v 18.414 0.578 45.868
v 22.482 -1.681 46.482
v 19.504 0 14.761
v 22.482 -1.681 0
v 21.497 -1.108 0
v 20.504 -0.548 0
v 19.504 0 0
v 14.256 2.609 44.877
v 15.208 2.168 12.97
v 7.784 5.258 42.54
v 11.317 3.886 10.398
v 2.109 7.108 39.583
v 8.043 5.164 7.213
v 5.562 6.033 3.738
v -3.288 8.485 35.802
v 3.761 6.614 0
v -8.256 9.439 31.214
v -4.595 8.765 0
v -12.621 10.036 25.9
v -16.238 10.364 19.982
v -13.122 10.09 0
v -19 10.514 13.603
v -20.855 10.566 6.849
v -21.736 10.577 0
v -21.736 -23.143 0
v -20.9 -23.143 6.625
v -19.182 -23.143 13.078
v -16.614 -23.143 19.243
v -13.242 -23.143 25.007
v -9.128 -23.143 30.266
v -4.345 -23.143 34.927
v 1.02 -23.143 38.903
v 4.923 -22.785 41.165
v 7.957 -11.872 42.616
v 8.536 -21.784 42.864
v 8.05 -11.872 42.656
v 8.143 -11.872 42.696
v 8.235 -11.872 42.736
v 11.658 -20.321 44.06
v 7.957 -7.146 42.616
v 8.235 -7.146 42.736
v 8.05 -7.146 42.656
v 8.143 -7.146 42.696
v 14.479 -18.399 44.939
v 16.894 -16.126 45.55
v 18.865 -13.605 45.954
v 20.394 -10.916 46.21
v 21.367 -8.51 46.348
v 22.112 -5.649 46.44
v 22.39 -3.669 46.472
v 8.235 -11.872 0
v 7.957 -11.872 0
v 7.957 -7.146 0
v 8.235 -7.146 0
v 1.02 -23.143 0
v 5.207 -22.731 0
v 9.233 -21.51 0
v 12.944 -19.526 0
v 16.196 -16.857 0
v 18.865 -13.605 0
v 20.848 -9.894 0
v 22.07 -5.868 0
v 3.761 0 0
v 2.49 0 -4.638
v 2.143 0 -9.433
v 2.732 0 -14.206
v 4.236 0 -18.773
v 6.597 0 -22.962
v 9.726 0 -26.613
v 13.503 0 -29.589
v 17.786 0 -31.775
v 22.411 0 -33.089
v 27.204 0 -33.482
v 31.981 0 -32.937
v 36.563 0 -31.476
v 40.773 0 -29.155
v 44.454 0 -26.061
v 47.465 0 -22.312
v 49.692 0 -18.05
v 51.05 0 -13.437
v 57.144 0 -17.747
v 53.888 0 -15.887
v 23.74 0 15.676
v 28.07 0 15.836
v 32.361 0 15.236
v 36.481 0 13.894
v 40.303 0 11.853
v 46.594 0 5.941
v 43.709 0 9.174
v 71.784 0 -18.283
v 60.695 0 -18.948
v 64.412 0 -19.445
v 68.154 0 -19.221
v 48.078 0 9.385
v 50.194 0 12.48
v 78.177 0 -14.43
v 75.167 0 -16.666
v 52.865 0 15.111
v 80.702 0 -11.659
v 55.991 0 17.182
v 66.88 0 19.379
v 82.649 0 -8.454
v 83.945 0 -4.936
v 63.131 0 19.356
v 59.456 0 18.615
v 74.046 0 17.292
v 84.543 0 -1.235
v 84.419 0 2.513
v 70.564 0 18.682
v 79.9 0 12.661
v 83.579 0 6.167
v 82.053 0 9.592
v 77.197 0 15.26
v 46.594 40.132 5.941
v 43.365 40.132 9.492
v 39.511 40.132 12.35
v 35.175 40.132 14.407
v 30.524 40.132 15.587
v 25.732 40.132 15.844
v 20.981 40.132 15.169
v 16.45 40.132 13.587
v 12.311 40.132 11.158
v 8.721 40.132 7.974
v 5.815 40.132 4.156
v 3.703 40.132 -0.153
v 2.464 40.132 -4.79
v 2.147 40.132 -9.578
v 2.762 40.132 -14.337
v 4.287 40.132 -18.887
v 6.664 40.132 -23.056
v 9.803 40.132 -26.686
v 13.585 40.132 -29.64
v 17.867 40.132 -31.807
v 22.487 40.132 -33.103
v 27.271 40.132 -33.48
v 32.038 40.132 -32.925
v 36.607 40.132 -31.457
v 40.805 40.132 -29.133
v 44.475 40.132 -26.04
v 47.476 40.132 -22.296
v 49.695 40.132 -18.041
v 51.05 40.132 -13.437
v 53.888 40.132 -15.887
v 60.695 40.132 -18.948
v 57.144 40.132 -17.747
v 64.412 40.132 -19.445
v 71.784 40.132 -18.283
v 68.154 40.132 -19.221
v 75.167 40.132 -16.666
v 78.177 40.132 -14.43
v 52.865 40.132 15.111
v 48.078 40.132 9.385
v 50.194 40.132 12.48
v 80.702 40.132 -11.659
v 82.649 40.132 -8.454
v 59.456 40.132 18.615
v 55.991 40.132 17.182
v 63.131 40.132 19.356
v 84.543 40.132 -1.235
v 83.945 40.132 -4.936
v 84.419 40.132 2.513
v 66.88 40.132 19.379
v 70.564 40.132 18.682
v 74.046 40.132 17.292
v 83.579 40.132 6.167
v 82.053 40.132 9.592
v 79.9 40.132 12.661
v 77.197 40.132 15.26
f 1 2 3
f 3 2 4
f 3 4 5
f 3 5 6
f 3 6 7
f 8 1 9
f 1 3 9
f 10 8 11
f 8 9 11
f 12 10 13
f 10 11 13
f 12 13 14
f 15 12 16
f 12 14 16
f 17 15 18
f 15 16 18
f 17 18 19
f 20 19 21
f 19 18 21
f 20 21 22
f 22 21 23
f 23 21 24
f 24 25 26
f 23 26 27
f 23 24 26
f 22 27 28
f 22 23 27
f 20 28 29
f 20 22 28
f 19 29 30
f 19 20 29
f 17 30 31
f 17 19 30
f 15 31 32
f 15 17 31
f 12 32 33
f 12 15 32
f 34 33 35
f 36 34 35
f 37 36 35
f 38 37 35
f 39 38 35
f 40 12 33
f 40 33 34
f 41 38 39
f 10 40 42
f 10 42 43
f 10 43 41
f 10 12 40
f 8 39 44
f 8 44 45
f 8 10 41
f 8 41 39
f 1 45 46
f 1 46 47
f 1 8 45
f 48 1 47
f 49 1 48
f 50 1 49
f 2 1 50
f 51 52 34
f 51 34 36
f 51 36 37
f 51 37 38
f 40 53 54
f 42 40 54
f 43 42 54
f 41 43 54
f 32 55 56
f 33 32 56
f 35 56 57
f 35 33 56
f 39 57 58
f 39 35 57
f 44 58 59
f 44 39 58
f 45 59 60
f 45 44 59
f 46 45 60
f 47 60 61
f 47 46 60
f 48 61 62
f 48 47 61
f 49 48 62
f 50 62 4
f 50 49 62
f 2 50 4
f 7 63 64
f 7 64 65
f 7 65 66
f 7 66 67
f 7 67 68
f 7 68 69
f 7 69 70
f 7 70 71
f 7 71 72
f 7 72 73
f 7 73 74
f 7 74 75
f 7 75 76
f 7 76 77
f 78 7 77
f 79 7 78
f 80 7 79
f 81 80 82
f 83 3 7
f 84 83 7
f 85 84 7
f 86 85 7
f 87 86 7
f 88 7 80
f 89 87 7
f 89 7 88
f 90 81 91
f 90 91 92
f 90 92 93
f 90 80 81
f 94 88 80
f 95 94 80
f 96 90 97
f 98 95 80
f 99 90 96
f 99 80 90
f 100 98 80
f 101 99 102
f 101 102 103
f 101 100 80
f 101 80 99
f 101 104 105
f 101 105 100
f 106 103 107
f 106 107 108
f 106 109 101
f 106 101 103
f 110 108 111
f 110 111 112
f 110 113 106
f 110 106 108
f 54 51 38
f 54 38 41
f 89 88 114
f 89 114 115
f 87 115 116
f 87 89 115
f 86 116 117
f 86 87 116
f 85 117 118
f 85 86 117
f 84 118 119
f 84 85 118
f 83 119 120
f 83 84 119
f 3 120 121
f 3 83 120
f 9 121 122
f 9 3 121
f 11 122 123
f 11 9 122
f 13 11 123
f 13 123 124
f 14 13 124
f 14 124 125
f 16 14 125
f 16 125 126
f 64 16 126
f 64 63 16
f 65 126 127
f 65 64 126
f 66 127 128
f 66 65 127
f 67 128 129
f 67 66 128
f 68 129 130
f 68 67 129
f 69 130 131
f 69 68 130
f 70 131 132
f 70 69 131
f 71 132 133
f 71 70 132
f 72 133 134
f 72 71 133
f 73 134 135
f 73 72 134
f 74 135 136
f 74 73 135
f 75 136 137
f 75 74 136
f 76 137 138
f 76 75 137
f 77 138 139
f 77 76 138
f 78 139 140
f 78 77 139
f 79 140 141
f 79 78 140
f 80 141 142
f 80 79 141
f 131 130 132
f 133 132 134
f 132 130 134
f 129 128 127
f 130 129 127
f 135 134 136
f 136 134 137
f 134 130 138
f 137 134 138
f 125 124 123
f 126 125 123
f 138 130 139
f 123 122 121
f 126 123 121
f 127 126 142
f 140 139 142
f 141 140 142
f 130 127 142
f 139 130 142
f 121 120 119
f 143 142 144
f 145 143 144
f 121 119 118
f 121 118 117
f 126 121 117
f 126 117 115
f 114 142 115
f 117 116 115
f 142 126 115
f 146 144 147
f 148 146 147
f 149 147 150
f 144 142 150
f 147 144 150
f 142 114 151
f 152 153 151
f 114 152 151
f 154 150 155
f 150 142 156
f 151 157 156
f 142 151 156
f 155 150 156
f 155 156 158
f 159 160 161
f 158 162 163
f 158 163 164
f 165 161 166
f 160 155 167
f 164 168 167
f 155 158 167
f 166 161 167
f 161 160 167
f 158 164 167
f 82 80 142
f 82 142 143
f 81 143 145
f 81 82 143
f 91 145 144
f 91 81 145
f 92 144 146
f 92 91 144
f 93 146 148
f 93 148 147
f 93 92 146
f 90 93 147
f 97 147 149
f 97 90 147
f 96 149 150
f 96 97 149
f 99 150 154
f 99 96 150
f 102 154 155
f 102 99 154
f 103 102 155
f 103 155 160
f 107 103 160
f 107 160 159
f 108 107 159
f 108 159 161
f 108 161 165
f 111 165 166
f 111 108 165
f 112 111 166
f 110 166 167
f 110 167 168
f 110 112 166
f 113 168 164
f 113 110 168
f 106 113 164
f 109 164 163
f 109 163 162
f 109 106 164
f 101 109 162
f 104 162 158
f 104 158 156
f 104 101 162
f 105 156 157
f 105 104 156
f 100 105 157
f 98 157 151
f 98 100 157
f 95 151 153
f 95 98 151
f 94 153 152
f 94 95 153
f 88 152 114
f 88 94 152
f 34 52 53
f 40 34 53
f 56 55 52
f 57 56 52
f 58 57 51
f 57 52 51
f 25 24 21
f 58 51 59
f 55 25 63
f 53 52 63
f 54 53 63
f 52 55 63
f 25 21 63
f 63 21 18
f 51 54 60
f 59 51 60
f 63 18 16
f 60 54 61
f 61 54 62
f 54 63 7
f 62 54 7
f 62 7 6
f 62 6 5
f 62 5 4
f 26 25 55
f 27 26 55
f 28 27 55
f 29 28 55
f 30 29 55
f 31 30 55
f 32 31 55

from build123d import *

# Parameters (mm, degrees)
F0_W        = 44.3030558527
F0_H        = 33.7232230231
F0_W_2      = 0.2780174837
F0_H_2      = 4.7262893058
F1_DEPTH    = 46.482
F2_T1_DEPTH = 280.6193273788
F3_R        = 21.4623585695
F4_T1_DEPTH = 270.9255150881
F6_DEPTH    = 40.132


# Not quite as in the source:
# - a fillet or chamfer that OpenCascade refuses, or shapes differently, is made with other operations: its cross-section is extruded or revolved along the edge and cut away or added


with BuildPart() as f1:
    # F0 (on Top) → F1 (new body)
    with BuildSketch(Plane.XY):
        with Locations((0.330619514, -6.2817768194)):
            Rectangle(F0_W, F0_H)
        with Locations((8.0964784138, -9.5091590192)):
            Rectangle(F0_W_2, F0_H_2, mode=Mode.SUBTRACT)
    extrude(amount=F1_DEPTH)

    # F2: fillet of radius 49.6700298323 on 1 edges, made by hand

    # F2_s2 → F2_t1 (cut)
    with BuildSketch(Plane.XZ.offset(-134.02788687)):
        with BuildLine():
            ThreePointArc((-21.8209084123, -2.8972208711), (-9.1217429277, 30.2730527625), (22.4821474403, 46.482))
            Line((22.4821474403, 46.482), (-21.8209084123, 46.482))
            Line((-21.8209084123, 46.482), (-21.8209084123, -2.8972208711))
        make_face()
    extrude(amount=F2_T1_DEPTH, mode=Mode.SUBTRACT)

    # F3
    f3_edges = [f1.edges().sort_by_distance(p)[0] for p in [
        (22.482147, -23.143388, 23.241),
    ]]
    fillet(f3_edges, radius=F3_R)

    # F4: fillet of radius 88.3022752574 on 2 edges, made by hand

    # F4_s2 → F4_t1 (cut)
    with BuildSketch(Plane.XY.offset(-112.221757544)):
        with BuildLine():
            ThreePointArc((22.4821474403, -1.6810297614), (0.8599678832, 7.4594865185), (-22.4065555773, 10.5798346922))
            Line((-22.4065555773, 10.5798346922), (22.4821474403, 10.5798346922))
            Line((22.4821474403, 10.5798346922), (22.4821474403, -1.6810297614))
        make_face()
    extrude(amount=F4_T1_DEPTH, mode=Mode.SUBTRACT)

    # F5 (on Front) → F6 (join)
    with BuildSketch(Plane.XZ):
        with BuildLine():
            ThreePointArc((51.0496692561, -13.4370785738), (51.3779423625, -11.1330198173), (51.4876921444, -8.808282204))
            ThreePointArc((51.4876921444, -8.808282204), (50.2324406688, -1.038184698), (46.594391977, 5.9414050633))
            ThreePointArc((46.594391977, 5.9414050633), (46.1598632778, -4.3598915413), (51.0496692561, -13.4370785738))
        make_face()
        with BuildLine():
            ThreePointArc((46.594391977, 5.9414050633), (50.2324406688, -1.038184698), (51.4876921444, -8.808282204))
            ThreePointArc((51.4876921444, -8.808282204), (51.3779423625, -11.1330198173), (51.0496692561, -13.4370785738))
            ThreePointArc((51.0496692561, -13.4370785738), (72.3613537789, -18.0621042721), (84.58179359, 0))
            ThreePointArc((84.58179359, 0), (68.1302794475, 19.2246129703), (46.594391977, 5.9414050633))
        make_face()
        with BuildLine():
            ThreePointArc((51.0496692561, -13.4370785738), (46.1598632778, -4.3598915413), (46.594391977, 5.9414050633))
            ThreePointArc((46.594391977, 5.9414050633), (2.7623791307, -14.3373401751), (51.0496692561, -13.4370785738))
        make_face()
    extrude(amount=-F6_DEPTH)


solid = f1.part
